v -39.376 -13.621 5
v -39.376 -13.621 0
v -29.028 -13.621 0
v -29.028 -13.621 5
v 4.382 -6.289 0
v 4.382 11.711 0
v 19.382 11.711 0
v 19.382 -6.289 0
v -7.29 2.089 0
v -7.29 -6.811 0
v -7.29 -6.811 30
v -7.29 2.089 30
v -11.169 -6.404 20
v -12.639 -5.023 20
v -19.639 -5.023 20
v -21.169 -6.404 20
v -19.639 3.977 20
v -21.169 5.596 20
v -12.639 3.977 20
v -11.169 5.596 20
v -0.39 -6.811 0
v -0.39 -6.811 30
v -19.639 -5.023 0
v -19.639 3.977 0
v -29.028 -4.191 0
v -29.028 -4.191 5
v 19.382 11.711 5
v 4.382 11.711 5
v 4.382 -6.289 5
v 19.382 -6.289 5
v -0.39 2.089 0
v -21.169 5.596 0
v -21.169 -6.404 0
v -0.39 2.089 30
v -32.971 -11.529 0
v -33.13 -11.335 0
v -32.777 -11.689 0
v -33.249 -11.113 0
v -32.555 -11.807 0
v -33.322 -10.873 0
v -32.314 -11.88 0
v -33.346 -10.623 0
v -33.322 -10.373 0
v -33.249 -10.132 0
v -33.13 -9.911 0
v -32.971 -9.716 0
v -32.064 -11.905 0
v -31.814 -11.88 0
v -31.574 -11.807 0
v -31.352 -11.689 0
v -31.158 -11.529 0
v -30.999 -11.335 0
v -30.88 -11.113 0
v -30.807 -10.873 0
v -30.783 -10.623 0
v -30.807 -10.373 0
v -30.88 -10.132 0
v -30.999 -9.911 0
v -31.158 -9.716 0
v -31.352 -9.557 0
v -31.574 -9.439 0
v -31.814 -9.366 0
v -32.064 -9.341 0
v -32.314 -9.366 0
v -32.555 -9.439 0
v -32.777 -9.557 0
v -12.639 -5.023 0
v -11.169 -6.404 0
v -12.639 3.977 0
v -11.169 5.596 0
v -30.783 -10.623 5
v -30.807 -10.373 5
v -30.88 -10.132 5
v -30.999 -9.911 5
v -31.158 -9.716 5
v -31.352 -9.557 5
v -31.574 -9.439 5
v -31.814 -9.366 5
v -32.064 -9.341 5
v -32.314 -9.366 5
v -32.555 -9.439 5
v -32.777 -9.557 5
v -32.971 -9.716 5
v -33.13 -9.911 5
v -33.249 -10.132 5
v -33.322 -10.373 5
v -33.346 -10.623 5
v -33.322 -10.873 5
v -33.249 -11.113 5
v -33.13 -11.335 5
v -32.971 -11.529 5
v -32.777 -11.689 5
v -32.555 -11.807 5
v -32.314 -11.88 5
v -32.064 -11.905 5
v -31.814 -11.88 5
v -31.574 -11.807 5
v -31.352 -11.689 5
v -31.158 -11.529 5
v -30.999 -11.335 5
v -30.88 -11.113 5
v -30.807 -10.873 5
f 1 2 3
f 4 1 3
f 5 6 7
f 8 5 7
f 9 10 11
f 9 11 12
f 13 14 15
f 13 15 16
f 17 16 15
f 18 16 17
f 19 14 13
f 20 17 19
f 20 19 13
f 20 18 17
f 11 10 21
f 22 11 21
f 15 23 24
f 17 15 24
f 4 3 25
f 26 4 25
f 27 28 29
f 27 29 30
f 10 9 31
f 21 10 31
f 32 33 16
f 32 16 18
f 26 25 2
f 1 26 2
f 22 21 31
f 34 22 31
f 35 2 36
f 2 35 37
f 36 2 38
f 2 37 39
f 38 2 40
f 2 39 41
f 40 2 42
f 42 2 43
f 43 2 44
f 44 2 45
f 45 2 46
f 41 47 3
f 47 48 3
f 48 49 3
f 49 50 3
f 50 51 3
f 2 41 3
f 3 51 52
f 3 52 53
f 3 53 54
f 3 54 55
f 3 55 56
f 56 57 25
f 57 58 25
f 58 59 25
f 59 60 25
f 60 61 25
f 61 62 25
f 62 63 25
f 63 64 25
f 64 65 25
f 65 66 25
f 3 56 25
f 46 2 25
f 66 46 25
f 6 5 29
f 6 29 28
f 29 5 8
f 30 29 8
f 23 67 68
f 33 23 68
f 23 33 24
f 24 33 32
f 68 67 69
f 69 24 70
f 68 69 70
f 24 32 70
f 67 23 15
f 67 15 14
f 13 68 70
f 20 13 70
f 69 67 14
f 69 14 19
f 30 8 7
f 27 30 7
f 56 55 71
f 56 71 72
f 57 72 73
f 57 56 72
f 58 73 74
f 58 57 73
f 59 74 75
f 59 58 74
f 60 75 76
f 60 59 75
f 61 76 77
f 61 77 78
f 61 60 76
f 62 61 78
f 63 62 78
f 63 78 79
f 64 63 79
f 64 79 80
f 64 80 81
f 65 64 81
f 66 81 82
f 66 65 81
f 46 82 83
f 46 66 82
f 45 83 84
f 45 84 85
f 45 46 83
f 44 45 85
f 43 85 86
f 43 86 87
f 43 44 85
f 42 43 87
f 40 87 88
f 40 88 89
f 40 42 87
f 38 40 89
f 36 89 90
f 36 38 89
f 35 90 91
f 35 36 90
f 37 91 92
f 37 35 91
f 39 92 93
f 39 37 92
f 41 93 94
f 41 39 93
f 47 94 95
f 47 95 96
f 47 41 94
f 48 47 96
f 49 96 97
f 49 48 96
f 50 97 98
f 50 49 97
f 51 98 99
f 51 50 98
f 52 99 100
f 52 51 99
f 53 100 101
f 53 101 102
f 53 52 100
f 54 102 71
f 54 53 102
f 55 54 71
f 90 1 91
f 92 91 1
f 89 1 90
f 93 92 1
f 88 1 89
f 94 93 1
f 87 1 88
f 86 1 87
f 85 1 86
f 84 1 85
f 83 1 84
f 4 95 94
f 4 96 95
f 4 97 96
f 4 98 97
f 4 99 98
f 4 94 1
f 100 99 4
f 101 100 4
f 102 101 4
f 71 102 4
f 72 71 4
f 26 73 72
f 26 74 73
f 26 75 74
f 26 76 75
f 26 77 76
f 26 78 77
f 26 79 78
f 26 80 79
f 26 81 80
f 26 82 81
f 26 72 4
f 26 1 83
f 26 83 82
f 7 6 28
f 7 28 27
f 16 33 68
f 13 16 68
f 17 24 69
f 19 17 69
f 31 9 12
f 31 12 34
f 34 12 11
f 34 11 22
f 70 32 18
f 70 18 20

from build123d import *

# Parameters (mm, degrees)
F0_R     = 1.281761
F3_DEPTH = 5
F1_W     = 10
F1_H     = 12
F1_W_2   = 7
F1_H_2   = 9
F4_DEPTH = 20
F2_W     = 6.9
F2_H     = 8.9
F5_DEPTH = 30
F6_W     = 15
F6_H     = 18
F7_DEPTH = 5


with BuildPart() as f3:
    # F0 (on Top) → F3 (new body)
    with BuildSketch(Plane.XY):
        Polygon((-29.028, -13.621232), (-29.028, -4.191335), (-39.375804, -13.621232), align=None)
        with Locations((-32.064408, -10.622831)):
            Circle(F0_R, mode=Mode.SUBTRACT)
    extrude(amount=F3_DEPTH)


with BuildPart() as f4:
    # F1 (on Top) → F4 (new body)
    with BuildSketch(Plane.XY):
        with Locations((-16.168614, -0.403789)):
            Rectangle(F1_W, F1_H)
        with Locations((-16.13925, -0.523452)):
            Rectangle(F1_W_2, F1_H_2, mode=Mode.SUBTRACT)
    extrude(amount=F4_DEPTH)


with BuildPart() as f5:
    # F2 (on Top) → F5 (new body)
    with BuildSketch(Plane.XY):
        with Locations((-3.840489, -2.361221)):
            Rectangle(F2_W, F2_H)
    extrude(amount=F5_DEPTH)


with BuildPart() as f7:
    # F6 (on Top) → F7 (new body)
    with BuildSketch(Plane.XY):
        with Locations((11.88155, 2.710978)):
            Rectangle(F6_W, F6_H)
    extrude(amount=F7_DEPTH)


solid = Compound([f3.part, f4.part, f5.part, f7.part])
